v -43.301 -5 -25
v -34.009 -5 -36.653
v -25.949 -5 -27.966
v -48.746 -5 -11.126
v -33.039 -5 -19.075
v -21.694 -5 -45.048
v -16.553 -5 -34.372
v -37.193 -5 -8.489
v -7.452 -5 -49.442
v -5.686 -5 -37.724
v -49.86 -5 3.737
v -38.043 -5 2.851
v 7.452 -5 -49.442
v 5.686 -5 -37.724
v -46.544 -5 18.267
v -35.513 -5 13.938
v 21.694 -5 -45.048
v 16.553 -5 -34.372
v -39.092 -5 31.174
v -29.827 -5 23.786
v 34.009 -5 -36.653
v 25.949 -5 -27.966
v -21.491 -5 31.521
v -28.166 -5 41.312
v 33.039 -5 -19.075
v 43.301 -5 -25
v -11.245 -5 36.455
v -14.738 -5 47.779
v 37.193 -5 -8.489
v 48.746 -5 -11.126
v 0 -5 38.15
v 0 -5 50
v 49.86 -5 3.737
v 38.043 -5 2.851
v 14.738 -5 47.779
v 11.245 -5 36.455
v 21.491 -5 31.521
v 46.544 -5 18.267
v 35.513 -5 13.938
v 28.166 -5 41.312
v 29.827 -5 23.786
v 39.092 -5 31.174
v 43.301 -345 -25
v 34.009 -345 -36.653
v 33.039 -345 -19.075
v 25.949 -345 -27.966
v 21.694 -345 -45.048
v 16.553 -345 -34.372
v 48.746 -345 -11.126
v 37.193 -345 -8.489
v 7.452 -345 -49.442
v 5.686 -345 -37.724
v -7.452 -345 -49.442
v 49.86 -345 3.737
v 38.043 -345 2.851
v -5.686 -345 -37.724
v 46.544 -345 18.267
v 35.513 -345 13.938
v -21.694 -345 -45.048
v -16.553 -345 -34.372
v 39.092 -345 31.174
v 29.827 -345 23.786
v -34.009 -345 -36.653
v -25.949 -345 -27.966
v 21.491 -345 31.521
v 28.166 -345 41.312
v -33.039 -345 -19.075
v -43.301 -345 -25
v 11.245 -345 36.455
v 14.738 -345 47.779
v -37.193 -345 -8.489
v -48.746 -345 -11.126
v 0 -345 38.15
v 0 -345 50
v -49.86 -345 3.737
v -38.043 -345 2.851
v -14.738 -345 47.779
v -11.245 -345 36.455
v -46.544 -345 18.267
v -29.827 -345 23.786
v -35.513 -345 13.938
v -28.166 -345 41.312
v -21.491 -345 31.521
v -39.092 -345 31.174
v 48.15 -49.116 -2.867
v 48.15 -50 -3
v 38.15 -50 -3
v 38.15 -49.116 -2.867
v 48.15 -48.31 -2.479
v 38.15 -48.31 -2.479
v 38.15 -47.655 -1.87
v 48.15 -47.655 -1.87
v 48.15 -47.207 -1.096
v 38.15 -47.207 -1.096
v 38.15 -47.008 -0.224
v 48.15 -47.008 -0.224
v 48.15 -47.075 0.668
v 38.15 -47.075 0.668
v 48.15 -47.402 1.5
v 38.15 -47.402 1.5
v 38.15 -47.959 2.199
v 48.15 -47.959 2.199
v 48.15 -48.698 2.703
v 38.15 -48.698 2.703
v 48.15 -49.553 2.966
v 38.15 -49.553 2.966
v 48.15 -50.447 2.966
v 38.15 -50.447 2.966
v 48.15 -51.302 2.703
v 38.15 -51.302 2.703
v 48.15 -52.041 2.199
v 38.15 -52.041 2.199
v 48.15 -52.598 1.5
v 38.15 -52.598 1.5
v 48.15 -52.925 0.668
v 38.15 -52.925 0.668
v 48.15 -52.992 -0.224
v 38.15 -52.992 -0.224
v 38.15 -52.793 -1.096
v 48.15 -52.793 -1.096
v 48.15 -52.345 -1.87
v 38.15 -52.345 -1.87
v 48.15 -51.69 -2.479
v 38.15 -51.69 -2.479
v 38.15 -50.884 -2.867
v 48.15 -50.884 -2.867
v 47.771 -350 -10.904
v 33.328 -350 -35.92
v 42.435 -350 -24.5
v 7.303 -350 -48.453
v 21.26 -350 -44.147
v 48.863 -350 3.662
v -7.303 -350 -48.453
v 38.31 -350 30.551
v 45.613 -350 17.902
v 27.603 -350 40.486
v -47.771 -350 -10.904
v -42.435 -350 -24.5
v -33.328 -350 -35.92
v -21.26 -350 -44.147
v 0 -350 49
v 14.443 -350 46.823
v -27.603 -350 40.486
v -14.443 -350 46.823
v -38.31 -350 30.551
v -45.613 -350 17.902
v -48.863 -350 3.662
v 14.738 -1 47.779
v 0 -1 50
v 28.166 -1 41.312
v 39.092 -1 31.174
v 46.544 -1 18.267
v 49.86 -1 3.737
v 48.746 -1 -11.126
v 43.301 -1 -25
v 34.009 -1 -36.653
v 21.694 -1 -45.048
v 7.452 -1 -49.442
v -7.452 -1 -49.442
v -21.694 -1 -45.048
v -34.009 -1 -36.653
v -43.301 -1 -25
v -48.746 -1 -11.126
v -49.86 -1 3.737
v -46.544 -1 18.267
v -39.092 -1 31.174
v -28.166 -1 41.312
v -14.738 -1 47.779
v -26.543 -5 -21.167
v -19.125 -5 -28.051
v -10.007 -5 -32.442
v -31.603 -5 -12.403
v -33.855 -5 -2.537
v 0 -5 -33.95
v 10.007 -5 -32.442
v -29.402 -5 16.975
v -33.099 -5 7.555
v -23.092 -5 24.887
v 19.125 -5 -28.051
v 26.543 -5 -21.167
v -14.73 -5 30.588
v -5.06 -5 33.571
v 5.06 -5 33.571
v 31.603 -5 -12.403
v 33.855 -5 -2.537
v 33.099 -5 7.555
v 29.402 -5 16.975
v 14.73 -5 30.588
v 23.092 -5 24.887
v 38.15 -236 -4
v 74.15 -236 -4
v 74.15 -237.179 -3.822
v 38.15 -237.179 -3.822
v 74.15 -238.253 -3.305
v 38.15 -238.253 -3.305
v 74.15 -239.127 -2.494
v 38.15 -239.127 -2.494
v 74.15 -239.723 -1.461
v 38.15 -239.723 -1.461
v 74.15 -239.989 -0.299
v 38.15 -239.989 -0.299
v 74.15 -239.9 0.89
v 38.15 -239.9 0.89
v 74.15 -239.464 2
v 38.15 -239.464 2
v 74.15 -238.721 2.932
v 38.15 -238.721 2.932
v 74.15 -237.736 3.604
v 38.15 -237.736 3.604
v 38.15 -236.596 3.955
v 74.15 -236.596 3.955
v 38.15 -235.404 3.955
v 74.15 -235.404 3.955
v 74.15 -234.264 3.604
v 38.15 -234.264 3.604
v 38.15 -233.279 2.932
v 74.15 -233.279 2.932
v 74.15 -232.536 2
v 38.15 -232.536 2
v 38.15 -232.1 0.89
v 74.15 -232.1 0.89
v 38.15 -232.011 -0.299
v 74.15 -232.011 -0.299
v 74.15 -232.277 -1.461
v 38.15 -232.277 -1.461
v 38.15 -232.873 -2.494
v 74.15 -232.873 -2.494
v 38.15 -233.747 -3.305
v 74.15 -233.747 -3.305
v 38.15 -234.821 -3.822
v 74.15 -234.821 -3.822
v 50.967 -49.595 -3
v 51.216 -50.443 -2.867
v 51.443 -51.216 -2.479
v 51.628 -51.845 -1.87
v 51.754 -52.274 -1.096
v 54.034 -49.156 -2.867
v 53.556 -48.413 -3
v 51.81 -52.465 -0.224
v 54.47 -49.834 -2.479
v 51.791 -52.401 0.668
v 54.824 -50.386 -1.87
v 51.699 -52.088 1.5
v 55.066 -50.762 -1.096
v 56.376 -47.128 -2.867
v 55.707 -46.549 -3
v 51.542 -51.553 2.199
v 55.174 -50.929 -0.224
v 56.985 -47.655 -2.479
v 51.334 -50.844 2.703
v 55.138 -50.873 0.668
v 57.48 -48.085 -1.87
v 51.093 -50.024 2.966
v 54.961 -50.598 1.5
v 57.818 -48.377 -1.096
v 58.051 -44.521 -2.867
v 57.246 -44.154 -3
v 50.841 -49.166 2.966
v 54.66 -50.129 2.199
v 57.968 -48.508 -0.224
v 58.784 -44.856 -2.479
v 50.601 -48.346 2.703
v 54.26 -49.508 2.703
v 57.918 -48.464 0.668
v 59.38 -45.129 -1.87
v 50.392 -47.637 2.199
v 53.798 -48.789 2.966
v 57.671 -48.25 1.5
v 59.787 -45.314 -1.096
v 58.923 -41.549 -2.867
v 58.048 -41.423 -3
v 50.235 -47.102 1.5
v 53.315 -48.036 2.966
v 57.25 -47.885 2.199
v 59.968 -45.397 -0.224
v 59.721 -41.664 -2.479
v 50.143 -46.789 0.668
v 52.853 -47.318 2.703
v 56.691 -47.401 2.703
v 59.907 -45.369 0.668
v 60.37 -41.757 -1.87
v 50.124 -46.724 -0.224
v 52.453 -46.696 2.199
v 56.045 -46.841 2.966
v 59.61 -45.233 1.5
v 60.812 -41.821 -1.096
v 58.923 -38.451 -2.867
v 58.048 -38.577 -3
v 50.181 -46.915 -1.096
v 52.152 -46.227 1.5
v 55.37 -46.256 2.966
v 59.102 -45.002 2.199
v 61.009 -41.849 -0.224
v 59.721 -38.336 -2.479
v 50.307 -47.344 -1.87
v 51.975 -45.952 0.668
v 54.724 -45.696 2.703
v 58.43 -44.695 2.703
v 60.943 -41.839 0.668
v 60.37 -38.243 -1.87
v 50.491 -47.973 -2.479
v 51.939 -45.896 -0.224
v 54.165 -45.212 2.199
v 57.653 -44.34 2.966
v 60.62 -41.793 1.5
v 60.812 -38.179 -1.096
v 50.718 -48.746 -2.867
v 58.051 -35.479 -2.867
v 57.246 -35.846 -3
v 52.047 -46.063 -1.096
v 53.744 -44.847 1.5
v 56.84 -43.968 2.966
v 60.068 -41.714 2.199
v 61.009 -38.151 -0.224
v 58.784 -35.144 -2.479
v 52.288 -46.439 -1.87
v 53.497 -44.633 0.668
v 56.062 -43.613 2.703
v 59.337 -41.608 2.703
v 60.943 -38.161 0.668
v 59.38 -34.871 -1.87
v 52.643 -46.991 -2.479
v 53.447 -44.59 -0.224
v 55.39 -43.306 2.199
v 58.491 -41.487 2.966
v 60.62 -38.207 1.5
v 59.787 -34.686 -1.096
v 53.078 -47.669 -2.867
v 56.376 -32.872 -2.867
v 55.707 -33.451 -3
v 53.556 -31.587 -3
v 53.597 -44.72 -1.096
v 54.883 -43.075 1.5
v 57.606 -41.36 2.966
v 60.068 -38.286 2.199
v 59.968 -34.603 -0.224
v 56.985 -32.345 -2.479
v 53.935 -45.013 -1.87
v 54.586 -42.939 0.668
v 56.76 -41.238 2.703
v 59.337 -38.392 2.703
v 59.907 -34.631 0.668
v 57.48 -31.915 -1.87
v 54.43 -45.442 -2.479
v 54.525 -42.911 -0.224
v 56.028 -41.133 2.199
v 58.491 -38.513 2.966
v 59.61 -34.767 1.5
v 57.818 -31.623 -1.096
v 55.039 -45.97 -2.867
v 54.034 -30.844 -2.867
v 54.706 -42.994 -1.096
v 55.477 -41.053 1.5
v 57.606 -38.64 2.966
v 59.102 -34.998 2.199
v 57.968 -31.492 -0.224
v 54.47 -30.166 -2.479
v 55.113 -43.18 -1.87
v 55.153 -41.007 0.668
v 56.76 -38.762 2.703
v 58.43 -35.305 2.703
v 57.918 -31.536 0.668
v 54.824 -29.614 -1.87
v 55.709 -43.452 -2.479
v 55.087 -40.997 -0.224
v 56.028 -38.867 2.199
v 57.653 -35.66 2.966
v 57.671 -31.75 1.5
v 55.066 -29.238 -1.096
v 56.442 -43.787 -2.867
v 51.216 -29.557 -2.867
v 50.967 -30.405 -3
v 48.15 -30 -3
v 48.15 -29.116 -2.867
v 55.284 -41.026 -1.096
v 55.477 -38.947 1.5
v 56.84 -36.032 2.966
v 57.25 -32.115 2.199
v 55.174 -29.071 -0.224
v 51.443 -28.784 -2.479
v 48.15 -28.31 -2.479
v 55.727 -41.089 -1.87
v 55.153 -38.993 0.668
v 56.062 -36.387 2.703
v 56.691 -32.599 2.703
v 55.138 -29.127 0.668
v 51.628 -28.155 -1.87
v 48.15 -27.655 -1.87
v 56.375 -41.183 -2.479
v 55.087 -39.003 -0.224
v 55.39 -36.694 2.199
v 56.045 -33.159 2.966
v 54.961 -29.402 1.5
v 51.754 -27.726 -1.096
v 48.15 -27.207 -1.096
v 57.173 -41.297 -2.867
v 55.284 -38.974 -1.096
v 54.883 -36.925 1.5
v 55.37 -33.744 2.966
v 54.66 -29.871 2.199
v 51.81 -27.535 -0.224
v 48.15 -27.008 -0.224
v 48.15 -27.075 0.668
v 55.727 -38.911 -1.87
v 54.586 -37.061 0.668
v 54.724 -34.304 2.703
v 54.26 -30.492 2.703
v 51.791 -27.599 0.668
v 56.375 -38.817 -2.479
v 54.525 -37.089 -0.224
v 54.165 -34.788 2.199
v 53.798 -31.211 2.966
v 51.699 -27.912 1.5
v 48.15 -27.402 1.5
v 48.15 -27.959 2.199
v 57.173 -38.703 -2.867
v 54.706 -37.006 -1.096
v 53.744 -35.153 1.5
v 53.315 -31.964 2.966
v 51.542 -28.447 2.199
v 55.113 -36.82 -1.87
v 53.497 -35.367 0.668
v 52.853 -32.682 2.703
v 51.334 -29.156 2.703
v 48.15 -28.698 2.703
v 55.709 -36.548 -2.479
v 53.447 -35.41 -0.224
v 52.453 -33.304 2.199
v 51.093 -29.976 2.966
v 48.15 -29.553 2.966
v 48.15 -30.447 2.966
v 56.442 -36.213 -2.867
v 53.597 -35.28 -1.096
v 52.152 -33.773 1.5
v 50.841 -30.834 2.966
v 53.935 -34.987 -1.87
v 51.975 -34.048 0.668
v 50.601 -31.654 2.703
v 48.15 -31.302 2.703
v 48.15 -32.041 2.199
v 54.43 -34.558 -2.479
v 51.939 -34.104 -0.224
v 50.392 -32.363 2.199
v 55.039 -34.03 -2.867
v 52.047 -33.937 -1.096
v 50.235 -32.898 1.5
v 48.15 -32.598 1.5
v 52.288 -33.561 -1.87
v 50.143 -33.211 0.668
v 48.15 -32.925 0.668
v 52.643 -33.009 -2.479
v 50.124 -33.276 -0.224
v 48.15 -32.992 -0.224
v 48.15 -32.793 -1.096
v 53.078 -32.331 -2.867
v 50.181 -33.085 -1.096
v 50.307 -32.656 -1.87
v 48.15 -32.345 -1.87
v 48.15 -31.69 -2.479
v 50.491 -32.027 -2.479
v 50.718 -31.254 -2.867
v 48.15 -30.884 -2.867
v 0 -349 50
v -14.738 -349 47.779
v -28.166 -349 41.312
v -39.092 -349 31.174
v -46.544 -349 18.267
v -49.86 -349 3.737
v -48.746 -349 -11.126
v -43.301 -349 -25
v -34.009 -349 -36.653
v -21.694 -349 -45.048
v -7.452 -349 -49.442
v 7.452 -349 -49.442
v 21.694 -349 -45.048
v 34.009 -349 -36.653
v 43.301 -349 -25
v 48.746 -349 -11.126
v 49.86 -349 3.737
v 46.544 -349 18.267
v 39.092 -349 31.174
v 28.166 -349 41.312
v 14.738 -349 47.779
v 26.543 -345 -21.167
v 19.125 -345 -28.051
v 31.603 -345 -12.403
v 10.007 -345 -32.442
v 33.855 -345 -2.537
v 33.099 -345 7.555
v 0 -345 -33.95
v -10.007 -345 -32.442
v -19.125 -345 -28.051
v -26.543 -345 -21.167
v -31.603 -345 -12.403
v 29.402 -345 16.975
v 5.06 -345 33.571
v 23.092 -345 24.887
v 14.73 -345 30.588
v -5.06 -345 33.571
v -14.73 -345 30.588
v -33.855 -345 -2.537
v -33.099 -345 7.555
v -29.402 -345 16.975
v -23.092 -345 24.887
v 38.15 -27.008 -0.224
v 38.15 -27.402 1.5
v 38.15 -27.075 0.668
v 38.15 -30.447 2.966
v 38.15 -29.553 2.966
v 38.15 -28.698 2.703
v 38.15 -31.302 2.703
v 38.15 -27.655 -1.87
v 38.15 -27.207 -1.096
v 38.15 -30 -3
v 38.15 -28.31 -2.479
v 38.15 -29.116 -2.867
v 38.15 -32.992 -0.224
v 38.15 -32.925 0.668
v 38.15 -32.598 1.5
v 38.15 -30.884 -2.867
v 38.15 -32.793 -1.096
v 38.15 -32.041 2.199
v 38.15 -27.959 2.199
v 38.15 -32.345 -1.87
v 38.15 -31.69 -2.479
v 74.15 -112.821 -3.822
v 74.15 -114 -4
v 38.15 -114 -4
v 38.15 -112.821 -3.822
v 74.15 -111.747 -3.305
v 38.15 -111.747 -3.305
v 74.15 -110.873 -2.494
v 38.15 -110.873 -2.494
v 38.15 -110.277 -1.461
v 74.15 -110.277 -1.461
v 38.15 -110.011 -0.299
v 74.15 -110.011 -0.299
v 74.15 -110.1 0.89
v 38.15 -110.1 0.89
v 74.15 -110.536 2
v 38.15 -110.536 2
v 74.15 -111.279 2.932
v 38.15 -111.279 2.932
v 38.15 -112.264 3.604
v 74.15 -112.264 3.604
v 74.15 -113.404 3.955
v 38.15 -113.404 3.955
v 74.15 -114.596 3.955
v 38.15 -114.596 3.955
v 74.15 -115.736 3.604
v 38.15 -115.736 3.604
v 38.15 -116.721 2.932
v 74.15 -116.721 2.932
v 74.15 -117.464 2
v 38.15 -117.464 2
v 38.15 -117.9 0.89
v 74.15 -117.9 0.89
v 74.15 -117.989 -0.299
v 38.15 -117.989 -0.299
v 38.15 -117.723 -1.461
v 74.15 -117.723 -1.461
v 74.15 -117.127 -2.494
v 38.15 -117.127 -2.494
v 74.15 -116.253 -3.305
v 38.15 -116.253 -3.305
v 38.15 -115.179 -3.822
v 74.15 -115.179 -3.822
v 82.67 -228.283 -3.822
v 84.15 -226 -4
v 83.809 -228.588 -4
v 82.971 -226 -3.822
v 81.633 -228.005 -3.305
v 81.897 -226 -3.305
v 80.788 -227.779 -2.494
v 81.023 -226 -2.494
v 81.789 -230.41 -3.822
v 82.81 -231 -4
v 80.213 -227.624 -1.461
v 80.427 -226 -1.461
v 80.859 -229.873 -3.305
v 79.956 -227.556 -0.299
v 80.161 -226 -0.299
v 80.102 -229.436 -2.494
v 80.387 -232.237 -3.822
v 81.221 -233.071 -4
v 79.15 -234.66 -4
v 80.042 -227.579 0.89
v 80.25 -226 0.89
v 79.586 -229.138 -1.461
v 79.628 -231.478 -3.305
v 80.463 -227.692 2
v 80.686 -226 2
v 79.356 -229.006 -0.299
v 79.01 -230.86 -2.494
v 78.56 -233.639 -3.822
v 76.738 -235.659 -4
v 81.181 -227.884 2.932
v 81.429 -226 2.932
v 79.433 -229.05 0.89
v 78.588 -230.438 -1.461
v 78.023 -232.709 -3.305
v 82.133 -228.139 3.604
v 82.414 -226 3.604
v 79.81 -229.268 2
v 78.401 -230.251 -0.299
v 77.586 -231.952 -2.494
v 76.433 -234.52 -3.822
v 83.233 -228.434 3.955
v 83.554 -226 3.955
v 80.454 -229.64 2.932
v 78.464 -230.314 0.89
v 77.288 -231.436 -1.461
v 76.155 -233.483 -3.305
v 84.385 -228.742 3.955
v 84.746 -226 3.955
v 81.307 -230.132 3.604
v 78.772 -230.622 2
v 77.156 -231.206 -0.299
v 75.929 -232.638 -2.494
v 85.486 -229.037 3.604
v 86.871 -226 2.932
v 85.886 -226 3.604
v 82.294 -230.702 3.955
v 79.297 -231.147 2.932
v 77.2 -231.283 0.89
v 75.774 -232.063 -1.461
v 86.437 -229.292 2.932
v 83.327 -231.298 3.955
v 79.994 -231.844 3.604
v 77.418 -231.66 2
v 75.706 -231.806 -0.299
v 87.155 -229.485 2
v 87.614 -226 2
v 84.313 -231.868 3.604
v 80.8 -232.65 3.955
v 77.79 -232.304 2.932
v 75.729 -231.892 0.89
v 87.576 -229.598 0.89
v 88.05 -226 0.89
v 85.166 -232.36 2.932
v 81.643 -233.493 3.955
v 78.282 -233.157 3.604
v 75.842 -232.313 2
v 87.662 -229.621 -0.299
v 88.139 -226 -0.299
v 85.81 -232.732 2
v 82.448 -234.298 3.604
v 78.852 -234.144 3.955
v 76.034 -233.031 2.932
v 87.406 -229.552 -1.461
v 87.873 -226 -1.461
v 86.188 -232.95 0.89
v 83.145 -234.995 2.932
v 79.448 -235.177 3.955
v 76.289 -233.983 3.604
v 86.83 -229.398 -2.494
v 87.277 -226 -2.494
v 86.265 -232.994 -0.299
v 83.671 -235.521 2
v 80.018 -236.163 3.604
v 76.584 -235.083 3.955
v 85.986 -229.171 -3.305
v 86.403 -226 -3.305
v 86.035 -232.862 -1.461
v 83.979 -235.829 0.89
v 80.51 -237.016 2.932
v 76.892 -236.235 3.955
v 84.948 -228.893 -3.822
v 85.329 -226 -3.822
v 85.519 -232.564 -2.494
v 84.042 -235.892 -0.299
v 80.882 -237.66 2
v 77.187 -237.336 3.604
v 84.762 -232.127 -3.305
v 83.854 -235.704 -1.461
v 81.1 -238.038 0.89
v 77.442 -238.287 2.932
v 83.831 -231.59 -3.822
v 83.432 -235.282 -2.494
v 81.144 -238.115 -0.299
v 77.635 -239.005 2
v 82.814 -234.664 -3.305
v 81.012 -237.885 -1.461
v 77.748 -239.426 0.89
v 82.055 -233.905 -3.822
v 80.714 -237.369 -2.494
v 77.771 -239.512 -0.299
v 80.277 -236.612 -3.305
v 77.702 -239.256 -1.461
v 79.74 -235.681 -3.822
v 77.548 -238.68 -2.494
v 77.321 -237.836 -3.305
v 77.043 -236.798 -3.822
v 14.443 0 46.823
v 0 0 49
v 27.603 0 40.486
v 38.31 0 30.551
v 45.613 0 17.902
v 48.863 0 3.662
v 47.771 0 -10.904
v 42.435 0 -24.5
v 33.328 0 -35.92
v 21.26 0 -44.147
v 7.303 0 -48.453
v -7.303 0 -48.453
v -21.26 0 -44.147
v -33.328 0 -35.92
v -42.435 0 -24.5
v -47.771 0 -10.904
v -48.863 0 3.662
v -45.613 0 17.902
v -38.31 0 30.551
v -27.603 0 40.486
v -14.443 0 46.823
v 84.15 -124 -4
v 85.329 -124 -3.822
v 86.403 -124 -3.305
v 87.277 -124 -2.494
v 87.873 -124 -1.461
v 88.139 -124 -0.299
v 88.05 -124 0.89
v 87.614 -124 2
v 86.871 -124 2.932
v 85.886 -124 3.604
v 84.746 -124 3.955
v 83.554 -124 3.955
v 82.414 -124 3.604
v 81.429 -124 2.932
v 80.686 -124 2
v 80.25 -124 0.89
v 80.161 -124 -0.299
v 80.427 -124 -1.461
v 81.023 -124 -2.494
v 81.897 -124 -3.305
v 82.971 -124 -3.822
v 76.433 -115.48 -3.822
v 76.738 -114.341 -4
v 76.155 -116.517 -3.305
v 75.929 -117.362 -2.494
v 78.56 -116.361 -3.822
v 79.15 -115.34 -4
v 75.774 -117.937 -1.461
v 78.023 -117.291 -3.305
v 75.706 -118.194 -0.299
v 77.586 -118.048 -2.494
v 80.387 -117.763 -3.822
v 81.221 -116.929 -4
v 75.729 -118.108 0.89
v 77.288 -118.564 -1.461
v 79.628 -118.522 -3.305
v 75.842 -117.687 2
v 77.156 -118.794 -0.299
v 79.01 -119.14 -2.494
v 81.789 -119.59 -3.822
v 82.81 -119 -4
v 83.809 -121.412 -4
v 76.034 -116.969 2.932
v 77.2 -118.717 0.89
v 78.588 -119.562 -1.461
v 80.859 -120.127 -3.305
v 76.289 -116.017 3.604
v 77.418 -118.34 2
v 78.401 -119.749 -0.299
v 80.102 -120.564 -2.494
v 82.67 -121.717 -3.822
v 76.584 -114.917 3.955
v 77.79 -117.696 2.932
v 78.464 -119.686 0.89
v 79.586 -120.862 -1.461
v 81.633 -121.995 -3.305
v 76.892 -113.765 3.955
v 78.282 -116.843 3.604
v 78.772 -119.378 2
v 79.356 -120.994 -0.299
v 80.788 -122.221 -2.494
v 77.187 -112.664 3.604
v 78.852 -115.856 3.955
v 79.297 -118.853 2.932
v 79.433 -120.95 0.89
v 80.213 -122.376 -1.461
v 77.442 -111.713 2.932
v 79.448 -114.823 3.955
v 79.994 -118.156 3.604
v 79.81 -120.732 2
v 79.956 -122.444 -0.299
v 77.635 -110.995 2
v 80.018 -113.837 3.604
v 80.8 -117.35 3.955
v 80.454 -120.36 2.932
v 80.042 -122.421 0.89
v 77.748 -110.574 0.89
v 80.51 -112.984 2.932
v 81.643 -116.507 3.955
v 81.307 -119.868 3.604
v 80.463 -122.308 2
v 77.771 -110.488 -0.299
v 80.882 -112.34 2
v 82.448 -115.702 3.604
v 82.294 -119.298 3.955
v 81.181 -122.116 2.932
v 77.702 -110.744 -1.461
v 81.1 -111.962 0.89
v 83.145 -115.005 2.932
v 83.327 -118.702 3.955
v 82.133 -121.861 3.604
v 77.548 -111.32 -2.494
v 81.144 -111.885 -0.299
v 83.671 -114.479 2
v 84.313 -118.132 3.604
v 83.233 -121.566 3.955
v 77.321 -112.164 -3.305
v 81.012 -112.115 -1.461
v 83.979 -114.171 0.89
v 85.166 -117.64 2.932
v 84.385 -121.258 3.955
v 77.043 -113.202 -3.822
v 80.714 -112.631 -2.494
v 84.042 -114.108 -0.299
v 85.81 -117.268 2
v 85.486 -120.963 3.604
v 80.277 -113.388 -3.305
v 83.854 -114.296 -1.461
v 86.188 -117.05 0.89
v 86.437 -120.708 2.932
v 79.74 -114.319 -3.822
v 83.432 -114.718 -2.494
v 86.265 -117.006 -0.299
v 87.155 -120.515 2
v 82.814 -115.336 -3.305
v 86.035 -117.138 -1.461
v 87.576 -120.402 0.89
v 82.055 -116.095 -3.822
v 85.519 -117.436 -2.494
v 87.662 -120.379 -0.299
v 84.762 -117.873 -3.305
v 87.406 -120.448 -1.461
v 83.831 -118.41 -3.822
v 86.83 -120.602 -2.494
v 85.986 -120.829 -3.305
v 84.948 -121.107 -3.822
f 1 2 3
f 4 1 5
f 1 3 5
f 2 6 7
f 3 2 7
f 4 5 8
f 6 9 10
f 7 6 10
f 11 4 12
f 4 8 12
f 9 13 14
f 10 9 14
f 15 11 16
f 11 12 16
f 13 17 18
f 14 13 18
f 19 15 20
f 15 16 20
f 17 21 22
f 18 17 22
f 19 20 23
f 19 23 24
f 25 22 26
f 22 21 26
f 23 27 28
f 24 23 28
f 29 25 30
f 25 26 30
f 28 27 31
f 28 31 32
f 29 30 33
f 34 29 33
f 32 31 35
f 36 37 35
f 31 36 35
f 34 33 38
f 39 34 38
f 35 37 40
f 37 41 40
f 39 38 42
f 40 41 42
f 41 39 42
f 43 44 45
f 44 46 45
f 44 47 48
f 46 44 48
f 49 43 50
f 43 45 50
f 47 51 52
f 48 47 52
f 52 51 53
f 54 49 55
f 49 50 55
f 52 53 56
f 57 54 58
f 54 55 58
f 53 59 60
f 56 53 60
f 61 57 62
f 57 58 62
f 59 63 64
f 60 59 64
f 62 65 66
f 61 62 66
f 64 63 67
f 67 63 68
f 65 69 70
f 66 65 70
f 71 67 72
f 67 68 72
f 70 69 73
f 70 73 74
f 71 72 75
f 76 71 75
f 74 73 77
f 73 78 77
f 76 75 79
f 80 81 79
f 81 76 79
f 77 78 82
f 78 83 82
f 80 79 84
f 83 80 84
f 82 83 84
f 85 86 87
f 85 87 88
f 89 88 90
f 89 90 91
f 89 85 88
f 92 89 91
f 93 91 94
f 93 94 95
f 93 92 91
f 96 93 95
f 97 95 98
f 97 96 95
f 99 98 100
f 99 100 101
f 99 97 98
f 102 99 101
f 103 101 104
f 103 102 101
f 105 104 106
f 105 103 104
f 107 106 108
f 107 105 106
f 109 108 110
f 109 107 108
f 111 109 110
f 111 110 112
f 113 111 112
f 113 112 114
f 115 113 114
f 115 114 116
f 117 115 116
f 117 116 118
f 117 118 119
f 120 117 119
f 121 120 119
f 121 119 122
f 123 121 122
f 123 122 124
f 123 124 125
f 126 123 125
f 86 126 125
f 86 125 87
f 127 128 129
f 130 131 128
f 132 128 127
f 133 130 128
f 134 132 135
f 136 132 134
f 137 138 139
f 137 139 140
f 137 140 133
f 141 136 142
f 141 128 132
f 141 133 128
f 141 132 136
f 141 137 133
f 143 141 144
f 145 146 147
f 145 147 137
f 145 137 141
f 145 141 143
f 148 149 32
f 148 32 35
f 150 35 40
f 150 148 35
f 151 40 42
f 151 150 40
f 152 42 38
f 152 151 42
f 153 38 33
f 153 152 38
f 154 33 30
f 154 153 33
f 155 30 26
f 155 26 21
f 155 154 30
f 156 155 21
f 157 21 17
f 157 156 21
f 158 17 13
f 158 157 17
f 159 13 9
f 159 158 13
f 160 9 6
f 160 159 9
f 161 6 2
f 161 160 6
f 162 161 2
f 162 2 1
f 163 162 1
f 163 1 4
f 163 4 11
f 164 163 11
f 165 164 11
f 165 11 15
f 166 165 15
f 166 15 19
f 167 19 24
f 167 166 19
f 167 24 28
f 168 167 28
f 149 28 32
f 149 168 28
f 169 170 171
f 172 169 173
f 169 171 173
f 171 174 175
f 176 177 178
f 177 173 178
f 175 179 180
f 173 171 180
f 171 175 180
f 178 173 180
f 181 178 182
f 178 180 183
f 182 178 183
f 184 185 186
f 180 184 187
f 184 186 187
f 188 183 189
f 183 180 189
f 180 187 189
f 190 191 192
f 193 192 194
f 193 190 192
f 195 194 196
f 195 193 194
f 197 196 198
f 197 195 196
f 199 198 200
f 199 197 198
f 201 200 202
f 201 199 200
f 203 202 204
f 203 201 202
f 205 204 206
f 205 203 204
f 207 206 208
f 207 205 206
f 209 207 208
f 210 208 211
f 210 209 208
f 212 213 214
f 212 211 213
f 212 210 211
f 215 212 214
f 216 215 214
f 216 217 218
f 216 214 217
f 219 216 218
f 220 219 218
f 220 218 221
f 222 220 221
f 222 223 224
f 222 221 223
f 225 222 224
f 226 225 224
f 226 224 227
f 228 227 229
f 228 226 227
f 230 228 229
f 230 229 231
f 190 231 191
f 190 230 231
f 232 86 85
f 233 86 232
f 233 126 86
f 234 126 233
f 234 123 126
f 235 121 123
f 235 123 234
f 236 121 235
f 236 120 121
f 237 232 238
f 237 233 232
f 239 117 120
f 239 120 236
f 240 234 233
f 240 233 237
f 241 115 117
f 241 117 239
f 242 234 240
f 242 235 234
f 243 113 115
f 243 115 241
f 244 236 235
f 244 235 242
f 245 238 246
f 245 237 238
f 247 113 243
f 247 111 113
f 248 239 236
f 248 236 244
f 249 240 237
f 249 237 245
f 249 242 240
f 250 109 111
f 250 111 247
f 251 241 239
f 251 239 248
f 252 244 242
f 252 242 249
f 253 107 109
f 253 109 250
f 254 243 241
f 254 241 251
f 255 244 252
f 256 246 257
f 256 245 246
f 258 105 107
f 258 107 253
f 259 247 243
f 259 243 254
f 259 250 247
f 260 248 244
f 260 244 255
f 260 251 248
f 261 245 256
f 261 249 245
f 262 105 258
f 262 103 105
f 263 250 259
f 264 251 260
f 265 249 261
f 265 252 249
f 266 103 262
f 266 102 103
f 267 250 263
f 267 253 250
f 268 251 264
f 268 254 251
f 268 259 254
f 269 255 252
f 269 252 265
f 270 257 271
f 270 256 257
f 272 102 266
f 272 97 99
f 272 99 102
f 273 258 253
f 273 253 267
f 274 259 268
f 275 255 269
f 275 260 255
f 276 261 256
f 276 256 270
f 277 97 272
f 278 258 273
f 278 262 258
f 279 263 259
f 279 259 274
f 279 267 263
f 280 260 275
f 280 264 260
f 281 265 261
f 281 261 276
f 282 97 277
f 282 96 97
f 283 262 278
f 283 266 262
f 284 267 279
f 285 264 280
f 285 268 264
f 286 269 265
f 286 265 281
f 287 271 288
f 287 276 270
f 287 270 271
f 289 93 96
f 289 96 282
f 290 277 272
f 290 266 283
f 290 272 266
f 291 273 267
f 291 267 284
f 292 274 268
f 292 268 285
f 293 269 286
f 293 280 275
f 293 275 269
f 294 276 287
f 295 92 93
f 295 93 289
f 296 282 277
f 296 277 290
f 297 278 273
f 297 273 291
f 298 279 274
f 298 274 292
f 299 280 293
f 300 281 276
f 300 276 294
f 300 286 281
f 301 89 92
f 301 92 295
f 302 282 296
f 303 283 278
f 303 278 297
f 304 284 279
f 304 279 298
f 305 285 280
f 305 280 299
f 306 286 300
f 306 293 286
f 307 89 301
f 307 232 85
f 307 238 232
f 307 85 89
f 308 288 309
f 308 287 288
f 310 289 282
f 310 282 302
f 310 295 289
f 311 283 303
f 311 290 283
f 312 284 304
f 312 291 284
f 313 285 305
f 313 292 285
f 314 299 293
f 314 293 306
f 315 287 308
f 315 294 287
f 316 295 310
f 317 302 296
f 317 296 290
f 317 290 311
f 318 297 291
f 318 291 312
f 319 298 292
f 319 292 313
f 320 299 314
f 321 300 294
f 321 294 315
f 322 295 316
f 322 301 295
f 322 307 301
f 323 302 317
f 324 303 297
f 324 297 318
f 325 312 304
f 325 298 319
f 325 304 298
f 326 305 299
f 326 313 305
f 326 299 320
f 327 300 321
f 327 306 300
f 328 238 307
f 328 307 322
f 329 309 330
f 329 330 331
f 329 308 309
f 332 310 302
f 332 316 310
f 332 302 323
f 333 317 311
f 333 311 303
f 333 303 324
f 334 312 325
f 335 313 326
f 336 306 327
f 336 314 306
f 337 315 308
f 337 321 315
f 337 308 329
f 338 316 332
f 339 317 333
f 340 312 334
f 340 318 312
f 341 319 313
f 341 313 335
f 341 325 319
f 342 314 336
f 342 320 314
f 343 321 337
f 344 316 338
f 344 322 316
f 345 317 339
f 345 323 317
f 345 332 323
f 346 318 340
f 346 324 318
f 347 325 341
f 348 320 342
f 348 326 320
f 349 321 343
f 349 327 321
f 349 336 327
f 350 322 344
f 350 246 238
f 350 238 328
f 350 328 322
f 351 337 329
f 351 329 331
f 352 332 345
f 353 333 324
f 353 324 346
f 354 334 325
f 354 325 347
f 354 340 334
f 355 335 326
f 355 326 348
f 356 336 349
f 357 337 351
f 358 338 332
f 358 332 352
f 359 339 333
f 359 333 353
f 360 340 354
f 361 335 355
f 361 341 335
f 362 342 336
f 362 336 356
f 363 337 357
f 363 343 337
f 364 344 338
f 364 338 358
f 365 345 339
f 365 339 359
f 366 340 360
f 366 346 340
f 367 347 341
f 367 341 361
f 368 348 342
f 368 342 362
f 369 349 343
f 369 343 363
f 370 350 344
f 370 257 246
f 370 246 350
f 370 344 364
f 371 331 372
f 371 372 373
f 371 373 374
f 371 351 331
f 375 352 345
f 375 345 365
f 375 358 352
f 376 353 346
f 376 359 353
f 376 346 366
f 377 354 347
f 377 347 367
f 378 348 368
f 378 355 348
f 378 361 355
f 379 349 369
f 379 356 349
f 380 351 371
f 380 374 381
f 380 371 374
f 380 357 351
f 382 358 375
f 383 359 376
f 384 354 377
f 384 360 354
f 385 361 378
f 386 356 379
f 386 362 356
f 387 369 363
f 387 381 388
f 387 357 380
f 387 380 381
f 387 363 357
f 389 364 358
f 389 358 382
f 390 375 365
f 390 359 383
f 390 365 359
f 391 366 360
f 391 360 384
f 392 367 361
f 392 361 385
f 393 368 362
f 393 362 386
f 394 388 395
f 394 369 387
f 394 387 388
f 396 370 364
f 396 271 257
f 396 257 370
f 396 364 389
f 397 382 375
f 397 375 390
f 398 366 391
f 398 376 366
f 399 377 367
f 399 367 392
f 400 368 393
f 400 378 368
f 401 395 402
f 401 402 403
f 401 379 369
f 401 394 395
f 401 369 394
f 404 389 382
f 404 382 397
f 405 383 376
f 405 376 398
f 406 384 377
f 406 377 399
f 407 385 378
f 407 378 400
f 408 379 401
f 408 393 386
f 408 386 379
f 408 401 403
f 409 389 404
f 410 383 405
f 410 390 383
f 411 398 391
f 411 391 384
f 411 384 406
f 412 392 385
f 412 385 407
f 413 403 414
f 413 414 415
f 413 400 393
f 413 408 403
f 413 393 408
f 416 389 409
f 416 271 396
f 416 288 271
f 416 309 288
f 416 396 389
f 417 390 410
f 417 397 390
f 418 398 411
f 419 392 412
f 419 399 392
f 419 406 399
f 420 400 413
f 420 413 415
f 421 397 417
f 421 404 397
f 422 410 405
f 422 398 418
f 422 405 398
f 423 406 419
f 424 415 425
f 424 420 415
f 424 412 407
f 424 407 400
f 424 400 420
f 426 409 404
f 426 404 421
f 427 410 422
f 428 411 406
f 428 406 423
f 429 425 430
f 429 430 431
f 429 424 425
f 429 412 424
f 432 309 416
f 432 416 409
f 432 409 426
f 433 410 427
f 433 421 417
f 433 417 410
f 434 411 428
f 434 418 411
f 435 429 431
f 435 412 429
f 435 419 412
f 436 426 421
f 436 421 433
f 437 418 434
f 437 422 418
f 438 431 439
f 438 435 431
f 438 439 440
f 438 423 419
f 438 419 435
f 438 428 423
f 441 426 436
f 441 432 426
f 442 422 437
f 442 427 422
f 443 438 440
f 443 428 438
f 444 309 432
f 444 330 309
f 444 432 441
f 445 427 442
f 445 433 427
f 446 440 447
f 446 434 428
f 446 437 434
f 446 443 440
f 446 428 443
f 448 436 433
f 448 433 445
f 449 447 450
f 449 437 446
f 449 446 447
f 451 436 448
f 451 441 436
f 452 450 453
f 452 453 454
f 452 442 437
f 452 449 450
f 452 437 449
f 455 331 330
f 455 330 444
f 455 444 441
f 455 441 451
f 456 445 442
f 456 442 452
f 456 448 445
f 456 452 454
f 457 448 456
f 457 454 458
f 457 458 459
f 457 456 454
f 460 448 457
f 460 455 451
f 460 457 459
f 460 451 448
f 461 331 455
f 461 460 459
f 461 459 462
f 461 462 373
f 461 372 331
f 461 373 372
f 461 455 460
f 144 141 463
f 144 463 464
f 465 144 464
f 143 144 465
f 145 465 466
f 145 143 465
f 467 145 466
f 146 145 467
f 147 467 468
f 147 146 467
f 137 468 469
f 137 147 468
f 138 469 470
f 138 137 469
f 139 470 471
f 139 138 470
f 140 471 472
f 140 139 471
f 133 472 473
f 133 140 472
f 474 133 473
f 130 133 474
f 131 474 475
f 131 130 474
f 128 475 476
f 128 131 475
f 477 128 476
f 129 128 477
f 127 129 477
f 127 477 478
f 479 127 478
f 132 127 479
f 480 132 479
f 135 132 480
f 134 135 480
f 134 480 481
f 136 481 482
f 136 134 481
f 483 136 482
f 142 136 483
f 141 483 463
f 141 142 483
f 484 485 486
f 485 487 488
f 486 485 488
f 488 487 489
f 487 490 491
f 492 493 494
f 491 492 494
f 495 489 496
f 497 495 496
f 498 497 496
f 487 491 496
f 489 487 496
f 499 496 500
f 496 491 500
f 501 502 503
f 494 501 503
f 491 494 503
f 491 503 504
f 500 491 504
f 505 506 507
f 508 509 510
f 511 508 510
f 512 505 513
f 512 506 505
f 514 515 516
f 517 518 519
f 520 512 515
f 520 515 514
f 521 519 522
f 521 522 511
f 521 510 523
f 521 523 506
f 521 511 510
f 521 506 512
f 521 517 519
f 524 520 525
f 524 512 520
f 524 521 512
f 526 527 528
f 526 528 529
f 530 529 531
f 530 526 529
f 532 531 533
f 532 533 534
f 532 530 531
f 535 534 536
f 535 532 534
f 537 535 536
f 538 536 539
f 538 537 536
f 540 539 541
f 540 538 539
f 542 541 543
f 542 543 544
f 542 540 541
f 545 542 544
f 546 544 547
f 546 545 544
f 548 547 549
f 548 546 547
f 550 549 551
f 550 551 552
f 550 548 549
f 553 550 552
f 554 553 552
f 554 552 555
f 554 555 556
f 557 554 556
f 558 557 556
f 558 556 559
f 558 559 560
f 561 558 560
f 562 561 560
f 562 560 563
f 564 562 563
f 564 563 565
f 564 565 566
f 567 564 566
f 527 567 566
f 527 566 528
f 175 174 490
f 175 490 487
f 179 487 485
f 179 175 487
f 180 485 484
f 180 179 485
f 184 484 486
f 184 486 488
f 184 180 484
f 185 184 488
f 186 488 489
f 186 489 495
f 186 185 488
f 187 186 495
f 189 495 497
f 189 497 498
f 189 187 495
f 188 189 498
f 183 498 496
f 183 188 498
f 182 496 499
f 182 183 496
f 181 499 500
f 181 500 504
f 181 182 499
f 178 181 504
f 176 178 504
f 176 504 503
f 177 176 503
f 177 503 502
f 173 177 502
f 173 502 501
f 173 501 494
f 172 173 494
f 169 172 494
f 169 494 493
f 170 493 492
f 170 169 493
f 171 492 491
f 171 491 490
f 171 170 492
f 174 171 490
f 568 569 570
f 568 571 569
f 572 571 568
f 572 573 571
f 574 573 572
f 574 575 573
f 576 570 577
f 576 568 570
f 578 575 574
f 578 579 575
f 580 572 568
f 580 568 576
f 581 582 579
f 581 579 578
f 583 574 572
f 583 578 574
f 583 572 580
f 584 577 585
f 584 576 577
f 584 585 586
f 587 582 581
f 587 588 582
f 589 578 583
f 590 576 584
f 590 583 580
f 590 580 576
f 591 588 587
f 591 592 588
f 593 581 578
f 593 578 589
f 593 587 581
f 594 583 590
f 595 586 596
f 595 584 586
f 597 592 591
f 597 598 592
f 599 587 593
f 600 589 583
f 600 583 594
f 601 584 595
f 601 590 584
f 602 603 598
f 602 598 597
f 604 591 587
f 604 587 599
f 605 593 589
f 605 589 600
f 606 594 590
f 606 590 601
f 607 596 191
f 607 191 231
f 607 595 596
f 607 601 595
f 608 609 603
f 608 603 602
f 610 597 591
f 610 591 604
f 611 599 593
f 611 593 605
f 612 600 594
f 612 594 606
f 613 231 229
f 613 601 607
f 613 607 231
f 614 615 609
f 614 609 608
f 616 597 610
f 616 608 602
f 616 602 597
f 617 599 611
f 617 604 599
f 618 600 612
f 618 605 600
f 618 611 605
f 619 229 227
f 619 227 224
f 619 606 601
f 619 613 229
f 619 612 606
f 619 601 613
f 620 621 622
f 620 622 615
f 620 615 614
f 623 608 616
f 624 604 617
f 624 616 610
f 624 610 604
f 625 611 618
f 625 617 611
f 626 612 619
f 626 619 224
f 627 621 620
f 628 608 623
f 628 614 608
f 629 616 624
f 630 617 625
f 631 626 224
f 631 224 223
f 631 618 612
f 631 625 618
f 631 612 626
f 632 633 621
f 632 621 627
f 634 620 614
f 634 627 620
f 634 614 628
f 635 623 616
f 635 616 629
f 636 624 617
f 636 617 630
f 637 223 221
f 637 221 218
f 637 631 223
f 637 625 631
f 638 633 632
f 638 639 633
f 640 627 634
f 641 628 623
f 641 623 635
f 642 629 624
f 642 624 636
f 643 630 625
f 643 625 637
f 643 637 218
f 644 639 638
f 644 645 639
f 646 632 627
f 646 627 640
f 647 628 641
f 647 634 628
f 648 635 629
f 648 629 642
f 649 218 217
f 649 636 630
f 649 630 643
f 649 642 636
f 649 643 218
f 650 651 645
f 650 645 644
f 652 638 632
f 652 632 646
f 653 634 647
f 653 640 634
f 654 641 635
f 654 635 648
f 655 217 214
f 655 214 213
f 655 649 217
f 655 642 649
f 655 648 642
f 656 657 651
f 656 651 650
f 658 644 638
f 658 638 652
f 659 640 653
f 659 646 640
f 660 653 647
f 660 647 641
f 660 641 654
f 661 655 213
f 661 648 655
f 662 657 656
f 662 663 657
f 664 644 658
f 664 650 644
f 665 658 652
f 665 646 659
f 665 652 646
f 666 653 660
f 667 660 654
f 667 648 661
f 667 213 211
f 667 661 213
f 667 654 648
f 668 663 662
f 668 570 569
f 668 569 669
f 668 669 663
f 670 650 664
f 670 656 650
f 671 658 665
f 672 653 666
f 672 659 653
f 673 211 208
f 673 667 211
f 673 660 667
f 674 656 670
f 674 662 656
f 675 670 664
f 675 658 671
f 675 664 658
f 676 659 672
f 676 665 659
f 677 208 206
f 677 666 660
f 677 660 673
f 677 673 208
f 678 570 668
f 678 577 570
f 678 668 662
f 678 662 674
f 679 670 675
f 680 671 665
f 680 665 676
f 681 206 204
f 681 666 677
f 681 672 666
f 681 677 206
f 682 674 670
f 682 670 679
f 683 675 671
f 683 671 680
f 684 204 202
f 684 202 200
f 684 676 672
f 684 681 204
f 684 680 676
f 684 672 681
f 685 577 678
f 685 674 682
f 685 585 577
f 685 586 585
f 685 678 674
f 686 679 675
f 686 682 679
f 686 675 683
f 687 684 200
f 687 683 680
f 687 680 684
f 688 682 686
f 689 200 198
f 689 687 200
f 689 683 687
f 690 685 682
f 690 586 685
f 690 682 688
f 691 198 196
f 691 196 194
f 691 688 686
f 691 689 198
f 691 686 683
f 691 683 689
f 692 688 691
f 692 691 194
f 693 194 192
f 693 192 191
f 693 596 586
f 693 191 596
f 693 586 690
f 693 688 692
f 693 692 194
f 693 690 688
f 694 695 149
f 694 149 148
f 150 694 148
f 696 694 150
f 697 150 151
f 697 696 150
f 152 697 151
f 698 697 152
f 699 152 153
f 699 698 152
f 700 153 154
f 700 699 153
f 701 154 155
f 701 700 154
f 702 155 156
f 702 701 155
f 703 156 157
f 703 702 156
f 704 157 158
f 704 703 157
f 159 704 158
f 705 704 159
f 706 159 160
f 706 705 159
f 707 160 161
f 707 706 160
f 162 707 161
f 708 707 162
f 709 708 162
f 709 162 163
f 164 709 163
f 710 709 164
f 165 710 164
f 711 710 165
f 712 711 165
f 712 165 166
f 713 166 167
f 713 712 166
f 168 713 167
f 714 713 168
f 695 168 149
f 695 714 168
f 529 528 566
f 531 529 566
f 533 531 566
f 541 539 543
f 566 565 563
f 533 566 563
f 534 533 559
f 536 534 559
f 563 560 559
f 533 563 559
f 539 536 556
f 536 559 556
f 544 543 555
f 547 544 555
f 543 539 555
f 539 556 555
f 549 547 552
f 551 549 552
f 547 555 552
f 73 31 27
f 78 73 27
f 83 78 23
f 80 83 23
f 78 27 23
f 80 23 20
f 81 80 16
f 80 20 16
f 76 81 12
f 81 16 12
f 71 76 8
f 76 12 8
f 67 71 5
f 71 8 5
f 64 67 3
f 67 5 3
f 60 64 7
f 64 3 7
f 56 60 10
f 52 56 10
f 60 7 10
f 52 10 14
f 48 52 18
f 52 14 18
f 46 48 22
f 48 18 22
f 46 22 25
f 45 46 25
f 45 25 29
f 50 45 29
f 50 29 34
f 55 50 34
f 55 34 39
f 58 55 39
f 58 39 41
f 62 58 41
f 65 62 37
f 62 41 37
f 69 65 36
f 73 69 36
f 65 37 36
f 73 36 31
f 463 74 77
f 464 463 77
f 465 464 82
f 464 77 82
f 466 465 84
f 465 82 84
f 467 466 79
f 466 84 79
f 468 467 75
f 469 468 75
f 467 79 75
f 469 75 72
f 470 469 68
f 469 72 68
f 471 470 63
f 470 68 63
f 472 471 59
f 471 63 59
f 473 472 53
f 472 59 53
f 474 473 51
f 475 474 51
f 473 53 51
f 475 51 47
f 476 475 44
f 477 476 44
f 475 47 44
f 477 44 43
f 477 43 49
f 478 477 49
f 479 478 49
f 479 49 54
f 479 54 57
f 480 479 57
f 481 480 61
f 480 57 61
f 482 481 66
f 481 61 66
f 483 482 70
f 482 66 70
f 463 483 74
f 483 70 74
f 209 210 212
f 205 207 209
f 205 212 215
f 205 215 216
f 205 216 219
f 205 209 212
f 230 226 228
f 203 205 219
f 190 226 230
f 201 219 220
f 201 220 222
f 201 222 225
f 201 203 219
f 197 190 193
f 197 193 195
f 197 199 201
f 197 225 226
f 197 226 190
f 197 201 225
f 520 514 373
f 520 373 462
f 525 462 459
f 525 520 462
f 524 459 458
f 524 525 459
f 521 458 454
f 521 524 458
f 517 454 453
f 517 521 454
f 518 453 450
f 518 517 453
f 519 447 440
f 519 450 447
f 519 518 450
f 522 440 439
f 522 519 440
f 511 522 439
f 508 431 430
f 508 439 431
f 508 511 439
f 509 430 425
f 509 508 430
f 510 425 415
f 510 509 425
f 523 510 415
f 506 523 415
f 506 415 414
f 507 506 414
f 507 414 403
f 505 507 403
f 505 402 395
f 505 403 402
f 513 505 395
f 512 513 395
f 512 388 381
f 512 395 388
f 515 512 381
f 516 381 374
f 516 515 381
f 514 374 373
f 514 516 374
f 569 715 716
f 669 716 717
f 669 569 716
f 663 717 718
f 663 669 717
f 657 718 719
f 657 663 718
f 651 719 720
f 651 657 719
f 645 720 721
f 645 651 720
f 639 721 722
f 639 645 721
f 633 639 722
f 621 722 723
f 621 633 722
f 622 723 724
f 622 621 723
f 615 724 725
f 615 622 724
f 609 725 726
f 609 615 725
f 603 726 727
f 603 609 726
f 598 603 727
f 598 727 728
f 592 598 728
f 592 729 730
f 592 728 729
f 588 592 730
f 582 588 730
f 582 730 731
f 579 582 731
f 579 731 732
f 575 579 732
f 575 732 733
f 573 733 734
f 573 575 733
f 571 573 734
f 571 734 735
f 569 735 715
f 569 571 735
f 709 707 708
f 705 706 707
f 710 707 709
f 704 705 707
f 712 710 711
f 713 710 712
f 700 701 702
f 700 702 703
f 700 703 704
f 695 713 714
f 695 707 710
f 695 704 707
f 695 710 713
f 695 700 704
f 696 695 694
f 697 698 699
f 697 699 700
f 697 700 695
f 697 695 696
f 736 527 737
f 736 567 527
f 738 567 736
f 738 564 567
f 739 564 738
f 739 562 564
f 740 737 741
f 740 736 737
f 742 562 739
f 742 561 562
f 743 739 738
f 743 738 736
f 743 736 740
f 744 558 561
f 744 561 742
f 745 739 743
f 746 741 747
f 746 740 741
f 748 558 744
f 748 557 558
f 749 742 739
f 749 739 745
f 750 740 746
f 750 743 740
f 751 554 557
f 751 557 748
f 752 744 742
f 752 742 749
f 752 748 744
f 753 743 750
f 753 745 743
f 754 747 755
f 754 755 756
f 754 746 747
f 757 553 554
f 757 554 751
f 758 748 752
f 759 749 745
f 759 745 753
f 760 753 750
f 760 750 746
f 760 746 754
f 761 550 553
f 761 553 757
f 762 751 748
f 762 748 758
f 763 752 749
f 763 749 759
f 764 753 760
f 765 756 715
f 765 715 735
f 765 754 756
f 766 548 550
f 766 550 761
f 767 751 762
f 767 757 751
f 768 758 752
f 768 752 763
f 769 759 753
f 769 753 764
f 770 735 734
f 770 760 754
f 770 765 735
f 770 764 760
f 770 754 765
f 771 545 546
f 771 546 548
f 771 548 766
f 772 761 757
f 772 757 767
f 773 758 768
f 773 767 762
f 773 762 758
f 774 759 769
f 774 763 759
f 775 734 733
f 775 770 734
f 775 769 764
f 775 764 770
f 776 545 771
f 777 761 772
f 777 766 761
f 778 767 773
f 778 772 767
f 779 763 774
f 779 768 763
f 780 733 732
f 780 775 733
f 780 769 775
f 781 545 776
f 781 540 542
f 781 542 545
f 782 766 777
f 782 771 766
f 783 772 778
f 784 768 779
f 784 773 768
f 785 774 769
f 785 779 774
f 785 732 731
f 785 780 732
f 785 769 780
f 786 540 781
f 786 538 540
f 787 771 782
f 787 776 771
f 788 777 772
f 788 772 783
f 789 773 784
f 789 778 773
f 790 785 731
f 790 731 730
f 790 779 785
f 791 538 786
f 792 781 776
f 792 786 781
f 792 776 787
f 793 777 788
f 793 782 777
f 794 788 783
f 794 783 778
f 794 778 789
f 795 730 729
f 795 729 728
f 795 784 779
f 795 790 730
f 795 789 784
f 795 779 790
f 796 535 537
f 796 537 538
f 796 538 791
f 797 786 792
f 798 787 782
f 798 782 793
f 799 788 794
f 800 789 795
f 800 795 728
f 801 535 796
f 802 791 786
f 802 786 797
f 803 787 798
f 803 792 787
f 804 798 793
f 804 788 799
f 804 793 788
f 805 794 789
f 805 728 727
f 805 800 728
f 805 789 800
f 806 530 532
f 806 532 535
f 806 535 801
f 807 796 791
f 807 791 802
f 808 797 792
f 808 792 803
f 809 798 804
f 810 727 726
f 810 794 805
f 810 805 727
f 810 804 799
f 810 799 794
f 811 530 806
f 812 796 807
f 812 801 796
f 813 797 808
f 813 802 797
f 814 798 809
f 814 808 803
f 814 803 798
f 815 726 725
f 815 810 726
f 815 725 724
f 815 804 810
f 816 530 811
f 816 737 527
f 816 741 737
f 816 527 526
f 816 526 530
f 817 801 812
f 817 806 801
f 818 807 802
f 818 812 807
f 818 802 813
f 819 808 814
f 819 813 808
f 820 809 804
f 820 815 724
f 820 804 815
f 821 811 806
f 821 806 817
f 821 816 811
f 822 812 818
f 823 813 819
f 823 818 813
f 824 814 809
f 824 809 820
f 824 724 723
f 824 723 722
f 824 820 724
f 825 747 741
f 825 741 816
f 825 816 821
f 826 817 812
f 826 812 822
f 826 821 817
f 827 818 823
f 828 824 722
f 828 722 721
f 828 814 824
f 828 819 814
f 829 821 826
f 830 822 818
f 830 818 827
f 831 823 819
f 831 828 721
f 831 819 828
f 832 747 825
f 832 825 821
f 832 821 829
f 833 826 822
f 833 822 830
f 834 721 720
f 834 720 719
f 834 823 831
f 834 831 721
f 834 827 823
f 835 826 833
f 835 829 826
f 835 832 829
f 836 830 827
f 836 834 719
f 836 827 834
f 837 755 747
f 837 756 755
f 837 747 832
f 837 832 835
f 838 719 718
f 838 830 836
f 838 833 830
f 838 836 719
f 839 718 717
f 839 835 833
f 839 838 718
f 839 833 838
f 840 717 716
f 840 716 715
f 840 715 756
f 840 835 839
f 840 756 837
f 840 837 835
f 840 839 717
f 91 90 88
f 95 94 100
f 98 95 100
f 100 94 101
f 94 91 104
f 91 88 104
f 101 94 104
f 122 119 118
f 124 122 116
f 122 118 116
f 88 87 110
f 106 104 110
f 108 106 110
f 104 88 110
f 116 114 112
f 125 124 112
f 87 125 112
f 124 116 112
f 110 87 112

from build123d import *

# Parameters (mm, degrees)
SKETCH_1_R      = 50
EXTRUDE_1_DEPTH = 5
SKETCH_2_R      = 38.15
SKETCH_2_R_2    = 33.95
EXTRUDE_2_DEPTH = 340
SKETCH_3_R      = 50
EXTRUDE_3_DEPTH = 5
SKETCH_4_R      = 4
CHAMFER_1_SIZE  = 1
SKETCH_6_R      = 3


with BuildPart() as part:
    # Sketch 1 → 填料-伸長1 (new body)
    with BuildSketch(Plane(origin=(0, 0, 0), x_dir=(1, 0, 0), z_dir=(0, 1, 0))):
        with Locations(Location((0, 0, 0), (0, 0, 270))):
            Circle(SKETCH_1_R)
    extrude(amount=-EXTRUDE_1_DEPTH)

    # Sketch 2 → 填料-伸長2 (add)
    with BuildSketch(Plane.XZ.offset(5)):
        with Locations(Location((0, 0, 0), (0, 0, 90))):
            Circle(SKETCH_2_R)
        with Locations(Location((0, 0, 0), (0, 0, 270))):
            Circle(SKETCH_2_R_2, mode=Mode.SUBTRACT)
    extrude(amount=EXTRUDE_2_DEPTH)

    # 草圖3 → 填料-伸長3 (add)
    with BuildSketch(Plane.XZ.offset(345)):
        with Locations(Location((0, 0, 0), (0, 0, 90))):
            Circle(SKETCH_3_R)
    extrude(amount=EXTRUDE_3_DEPTH)

    # 導角1
    chamfer_1_edges = [part.edges().sort_by_distance(p)[0] for p in [
        (0, -350, -50),
        (0, 0, -50),
    ]]
    chamfer(chamfer_1_edges, length=CHAMFER_1_SIZE)


with BuildPart() as body_2:
    # 掃出1: sweep along a path in 草圖5
    with BuildLine(Plane.XY) as sweep_1_path:
        Line((38.15, -114), (74.15, -114))
        ThreePointArc((74.15, -114), (81.221067812, -116.928932188), (84.15, -124))
        Line((84.15, -124), (84.15, -226))
        ThreePointArc((84.15, -226), (81.221067812, -233.071067812), (74.15, -236))
        Line((74.15, -236), (38.15, -236))
    # 草圖4 → 掃出1 (sweep)
    with BuildSketch(Plane(origin=(38.15, 0, 0), x_dir=(0, 0, -1), z_dir=(1, 0, 0))):
        with Locations((0, -114)):
            Circle(SKETCH_4_R)
    sweep(path=sweep_1_path.line)


with BuildPart() as body_3:
    # 掃出2: sweep along a path in 草圖7
    with BuildLine(Plane.XY) as sweep_2_path:
        Line((38.15, -50), (48.15, -50))
        ThreePointArc((48.15, -50), (58.15, -40), (48.15, -30))
        Line((48.15, -30), (38.15, -30))
    # 草圖6 → 掃出2 (sweep)
    with BuildSketch(Plane(origin=(38.15, 0, 0), x_dir=(0, 0, -1), z_dir=(1, 0, 0))):
        with Locations((0, -50)):
            Circle(SKETCH_6_R)
    sweep(path=sweep_2_path.line)


solid = Compound([part.part, body_2.part, body_3.part])
